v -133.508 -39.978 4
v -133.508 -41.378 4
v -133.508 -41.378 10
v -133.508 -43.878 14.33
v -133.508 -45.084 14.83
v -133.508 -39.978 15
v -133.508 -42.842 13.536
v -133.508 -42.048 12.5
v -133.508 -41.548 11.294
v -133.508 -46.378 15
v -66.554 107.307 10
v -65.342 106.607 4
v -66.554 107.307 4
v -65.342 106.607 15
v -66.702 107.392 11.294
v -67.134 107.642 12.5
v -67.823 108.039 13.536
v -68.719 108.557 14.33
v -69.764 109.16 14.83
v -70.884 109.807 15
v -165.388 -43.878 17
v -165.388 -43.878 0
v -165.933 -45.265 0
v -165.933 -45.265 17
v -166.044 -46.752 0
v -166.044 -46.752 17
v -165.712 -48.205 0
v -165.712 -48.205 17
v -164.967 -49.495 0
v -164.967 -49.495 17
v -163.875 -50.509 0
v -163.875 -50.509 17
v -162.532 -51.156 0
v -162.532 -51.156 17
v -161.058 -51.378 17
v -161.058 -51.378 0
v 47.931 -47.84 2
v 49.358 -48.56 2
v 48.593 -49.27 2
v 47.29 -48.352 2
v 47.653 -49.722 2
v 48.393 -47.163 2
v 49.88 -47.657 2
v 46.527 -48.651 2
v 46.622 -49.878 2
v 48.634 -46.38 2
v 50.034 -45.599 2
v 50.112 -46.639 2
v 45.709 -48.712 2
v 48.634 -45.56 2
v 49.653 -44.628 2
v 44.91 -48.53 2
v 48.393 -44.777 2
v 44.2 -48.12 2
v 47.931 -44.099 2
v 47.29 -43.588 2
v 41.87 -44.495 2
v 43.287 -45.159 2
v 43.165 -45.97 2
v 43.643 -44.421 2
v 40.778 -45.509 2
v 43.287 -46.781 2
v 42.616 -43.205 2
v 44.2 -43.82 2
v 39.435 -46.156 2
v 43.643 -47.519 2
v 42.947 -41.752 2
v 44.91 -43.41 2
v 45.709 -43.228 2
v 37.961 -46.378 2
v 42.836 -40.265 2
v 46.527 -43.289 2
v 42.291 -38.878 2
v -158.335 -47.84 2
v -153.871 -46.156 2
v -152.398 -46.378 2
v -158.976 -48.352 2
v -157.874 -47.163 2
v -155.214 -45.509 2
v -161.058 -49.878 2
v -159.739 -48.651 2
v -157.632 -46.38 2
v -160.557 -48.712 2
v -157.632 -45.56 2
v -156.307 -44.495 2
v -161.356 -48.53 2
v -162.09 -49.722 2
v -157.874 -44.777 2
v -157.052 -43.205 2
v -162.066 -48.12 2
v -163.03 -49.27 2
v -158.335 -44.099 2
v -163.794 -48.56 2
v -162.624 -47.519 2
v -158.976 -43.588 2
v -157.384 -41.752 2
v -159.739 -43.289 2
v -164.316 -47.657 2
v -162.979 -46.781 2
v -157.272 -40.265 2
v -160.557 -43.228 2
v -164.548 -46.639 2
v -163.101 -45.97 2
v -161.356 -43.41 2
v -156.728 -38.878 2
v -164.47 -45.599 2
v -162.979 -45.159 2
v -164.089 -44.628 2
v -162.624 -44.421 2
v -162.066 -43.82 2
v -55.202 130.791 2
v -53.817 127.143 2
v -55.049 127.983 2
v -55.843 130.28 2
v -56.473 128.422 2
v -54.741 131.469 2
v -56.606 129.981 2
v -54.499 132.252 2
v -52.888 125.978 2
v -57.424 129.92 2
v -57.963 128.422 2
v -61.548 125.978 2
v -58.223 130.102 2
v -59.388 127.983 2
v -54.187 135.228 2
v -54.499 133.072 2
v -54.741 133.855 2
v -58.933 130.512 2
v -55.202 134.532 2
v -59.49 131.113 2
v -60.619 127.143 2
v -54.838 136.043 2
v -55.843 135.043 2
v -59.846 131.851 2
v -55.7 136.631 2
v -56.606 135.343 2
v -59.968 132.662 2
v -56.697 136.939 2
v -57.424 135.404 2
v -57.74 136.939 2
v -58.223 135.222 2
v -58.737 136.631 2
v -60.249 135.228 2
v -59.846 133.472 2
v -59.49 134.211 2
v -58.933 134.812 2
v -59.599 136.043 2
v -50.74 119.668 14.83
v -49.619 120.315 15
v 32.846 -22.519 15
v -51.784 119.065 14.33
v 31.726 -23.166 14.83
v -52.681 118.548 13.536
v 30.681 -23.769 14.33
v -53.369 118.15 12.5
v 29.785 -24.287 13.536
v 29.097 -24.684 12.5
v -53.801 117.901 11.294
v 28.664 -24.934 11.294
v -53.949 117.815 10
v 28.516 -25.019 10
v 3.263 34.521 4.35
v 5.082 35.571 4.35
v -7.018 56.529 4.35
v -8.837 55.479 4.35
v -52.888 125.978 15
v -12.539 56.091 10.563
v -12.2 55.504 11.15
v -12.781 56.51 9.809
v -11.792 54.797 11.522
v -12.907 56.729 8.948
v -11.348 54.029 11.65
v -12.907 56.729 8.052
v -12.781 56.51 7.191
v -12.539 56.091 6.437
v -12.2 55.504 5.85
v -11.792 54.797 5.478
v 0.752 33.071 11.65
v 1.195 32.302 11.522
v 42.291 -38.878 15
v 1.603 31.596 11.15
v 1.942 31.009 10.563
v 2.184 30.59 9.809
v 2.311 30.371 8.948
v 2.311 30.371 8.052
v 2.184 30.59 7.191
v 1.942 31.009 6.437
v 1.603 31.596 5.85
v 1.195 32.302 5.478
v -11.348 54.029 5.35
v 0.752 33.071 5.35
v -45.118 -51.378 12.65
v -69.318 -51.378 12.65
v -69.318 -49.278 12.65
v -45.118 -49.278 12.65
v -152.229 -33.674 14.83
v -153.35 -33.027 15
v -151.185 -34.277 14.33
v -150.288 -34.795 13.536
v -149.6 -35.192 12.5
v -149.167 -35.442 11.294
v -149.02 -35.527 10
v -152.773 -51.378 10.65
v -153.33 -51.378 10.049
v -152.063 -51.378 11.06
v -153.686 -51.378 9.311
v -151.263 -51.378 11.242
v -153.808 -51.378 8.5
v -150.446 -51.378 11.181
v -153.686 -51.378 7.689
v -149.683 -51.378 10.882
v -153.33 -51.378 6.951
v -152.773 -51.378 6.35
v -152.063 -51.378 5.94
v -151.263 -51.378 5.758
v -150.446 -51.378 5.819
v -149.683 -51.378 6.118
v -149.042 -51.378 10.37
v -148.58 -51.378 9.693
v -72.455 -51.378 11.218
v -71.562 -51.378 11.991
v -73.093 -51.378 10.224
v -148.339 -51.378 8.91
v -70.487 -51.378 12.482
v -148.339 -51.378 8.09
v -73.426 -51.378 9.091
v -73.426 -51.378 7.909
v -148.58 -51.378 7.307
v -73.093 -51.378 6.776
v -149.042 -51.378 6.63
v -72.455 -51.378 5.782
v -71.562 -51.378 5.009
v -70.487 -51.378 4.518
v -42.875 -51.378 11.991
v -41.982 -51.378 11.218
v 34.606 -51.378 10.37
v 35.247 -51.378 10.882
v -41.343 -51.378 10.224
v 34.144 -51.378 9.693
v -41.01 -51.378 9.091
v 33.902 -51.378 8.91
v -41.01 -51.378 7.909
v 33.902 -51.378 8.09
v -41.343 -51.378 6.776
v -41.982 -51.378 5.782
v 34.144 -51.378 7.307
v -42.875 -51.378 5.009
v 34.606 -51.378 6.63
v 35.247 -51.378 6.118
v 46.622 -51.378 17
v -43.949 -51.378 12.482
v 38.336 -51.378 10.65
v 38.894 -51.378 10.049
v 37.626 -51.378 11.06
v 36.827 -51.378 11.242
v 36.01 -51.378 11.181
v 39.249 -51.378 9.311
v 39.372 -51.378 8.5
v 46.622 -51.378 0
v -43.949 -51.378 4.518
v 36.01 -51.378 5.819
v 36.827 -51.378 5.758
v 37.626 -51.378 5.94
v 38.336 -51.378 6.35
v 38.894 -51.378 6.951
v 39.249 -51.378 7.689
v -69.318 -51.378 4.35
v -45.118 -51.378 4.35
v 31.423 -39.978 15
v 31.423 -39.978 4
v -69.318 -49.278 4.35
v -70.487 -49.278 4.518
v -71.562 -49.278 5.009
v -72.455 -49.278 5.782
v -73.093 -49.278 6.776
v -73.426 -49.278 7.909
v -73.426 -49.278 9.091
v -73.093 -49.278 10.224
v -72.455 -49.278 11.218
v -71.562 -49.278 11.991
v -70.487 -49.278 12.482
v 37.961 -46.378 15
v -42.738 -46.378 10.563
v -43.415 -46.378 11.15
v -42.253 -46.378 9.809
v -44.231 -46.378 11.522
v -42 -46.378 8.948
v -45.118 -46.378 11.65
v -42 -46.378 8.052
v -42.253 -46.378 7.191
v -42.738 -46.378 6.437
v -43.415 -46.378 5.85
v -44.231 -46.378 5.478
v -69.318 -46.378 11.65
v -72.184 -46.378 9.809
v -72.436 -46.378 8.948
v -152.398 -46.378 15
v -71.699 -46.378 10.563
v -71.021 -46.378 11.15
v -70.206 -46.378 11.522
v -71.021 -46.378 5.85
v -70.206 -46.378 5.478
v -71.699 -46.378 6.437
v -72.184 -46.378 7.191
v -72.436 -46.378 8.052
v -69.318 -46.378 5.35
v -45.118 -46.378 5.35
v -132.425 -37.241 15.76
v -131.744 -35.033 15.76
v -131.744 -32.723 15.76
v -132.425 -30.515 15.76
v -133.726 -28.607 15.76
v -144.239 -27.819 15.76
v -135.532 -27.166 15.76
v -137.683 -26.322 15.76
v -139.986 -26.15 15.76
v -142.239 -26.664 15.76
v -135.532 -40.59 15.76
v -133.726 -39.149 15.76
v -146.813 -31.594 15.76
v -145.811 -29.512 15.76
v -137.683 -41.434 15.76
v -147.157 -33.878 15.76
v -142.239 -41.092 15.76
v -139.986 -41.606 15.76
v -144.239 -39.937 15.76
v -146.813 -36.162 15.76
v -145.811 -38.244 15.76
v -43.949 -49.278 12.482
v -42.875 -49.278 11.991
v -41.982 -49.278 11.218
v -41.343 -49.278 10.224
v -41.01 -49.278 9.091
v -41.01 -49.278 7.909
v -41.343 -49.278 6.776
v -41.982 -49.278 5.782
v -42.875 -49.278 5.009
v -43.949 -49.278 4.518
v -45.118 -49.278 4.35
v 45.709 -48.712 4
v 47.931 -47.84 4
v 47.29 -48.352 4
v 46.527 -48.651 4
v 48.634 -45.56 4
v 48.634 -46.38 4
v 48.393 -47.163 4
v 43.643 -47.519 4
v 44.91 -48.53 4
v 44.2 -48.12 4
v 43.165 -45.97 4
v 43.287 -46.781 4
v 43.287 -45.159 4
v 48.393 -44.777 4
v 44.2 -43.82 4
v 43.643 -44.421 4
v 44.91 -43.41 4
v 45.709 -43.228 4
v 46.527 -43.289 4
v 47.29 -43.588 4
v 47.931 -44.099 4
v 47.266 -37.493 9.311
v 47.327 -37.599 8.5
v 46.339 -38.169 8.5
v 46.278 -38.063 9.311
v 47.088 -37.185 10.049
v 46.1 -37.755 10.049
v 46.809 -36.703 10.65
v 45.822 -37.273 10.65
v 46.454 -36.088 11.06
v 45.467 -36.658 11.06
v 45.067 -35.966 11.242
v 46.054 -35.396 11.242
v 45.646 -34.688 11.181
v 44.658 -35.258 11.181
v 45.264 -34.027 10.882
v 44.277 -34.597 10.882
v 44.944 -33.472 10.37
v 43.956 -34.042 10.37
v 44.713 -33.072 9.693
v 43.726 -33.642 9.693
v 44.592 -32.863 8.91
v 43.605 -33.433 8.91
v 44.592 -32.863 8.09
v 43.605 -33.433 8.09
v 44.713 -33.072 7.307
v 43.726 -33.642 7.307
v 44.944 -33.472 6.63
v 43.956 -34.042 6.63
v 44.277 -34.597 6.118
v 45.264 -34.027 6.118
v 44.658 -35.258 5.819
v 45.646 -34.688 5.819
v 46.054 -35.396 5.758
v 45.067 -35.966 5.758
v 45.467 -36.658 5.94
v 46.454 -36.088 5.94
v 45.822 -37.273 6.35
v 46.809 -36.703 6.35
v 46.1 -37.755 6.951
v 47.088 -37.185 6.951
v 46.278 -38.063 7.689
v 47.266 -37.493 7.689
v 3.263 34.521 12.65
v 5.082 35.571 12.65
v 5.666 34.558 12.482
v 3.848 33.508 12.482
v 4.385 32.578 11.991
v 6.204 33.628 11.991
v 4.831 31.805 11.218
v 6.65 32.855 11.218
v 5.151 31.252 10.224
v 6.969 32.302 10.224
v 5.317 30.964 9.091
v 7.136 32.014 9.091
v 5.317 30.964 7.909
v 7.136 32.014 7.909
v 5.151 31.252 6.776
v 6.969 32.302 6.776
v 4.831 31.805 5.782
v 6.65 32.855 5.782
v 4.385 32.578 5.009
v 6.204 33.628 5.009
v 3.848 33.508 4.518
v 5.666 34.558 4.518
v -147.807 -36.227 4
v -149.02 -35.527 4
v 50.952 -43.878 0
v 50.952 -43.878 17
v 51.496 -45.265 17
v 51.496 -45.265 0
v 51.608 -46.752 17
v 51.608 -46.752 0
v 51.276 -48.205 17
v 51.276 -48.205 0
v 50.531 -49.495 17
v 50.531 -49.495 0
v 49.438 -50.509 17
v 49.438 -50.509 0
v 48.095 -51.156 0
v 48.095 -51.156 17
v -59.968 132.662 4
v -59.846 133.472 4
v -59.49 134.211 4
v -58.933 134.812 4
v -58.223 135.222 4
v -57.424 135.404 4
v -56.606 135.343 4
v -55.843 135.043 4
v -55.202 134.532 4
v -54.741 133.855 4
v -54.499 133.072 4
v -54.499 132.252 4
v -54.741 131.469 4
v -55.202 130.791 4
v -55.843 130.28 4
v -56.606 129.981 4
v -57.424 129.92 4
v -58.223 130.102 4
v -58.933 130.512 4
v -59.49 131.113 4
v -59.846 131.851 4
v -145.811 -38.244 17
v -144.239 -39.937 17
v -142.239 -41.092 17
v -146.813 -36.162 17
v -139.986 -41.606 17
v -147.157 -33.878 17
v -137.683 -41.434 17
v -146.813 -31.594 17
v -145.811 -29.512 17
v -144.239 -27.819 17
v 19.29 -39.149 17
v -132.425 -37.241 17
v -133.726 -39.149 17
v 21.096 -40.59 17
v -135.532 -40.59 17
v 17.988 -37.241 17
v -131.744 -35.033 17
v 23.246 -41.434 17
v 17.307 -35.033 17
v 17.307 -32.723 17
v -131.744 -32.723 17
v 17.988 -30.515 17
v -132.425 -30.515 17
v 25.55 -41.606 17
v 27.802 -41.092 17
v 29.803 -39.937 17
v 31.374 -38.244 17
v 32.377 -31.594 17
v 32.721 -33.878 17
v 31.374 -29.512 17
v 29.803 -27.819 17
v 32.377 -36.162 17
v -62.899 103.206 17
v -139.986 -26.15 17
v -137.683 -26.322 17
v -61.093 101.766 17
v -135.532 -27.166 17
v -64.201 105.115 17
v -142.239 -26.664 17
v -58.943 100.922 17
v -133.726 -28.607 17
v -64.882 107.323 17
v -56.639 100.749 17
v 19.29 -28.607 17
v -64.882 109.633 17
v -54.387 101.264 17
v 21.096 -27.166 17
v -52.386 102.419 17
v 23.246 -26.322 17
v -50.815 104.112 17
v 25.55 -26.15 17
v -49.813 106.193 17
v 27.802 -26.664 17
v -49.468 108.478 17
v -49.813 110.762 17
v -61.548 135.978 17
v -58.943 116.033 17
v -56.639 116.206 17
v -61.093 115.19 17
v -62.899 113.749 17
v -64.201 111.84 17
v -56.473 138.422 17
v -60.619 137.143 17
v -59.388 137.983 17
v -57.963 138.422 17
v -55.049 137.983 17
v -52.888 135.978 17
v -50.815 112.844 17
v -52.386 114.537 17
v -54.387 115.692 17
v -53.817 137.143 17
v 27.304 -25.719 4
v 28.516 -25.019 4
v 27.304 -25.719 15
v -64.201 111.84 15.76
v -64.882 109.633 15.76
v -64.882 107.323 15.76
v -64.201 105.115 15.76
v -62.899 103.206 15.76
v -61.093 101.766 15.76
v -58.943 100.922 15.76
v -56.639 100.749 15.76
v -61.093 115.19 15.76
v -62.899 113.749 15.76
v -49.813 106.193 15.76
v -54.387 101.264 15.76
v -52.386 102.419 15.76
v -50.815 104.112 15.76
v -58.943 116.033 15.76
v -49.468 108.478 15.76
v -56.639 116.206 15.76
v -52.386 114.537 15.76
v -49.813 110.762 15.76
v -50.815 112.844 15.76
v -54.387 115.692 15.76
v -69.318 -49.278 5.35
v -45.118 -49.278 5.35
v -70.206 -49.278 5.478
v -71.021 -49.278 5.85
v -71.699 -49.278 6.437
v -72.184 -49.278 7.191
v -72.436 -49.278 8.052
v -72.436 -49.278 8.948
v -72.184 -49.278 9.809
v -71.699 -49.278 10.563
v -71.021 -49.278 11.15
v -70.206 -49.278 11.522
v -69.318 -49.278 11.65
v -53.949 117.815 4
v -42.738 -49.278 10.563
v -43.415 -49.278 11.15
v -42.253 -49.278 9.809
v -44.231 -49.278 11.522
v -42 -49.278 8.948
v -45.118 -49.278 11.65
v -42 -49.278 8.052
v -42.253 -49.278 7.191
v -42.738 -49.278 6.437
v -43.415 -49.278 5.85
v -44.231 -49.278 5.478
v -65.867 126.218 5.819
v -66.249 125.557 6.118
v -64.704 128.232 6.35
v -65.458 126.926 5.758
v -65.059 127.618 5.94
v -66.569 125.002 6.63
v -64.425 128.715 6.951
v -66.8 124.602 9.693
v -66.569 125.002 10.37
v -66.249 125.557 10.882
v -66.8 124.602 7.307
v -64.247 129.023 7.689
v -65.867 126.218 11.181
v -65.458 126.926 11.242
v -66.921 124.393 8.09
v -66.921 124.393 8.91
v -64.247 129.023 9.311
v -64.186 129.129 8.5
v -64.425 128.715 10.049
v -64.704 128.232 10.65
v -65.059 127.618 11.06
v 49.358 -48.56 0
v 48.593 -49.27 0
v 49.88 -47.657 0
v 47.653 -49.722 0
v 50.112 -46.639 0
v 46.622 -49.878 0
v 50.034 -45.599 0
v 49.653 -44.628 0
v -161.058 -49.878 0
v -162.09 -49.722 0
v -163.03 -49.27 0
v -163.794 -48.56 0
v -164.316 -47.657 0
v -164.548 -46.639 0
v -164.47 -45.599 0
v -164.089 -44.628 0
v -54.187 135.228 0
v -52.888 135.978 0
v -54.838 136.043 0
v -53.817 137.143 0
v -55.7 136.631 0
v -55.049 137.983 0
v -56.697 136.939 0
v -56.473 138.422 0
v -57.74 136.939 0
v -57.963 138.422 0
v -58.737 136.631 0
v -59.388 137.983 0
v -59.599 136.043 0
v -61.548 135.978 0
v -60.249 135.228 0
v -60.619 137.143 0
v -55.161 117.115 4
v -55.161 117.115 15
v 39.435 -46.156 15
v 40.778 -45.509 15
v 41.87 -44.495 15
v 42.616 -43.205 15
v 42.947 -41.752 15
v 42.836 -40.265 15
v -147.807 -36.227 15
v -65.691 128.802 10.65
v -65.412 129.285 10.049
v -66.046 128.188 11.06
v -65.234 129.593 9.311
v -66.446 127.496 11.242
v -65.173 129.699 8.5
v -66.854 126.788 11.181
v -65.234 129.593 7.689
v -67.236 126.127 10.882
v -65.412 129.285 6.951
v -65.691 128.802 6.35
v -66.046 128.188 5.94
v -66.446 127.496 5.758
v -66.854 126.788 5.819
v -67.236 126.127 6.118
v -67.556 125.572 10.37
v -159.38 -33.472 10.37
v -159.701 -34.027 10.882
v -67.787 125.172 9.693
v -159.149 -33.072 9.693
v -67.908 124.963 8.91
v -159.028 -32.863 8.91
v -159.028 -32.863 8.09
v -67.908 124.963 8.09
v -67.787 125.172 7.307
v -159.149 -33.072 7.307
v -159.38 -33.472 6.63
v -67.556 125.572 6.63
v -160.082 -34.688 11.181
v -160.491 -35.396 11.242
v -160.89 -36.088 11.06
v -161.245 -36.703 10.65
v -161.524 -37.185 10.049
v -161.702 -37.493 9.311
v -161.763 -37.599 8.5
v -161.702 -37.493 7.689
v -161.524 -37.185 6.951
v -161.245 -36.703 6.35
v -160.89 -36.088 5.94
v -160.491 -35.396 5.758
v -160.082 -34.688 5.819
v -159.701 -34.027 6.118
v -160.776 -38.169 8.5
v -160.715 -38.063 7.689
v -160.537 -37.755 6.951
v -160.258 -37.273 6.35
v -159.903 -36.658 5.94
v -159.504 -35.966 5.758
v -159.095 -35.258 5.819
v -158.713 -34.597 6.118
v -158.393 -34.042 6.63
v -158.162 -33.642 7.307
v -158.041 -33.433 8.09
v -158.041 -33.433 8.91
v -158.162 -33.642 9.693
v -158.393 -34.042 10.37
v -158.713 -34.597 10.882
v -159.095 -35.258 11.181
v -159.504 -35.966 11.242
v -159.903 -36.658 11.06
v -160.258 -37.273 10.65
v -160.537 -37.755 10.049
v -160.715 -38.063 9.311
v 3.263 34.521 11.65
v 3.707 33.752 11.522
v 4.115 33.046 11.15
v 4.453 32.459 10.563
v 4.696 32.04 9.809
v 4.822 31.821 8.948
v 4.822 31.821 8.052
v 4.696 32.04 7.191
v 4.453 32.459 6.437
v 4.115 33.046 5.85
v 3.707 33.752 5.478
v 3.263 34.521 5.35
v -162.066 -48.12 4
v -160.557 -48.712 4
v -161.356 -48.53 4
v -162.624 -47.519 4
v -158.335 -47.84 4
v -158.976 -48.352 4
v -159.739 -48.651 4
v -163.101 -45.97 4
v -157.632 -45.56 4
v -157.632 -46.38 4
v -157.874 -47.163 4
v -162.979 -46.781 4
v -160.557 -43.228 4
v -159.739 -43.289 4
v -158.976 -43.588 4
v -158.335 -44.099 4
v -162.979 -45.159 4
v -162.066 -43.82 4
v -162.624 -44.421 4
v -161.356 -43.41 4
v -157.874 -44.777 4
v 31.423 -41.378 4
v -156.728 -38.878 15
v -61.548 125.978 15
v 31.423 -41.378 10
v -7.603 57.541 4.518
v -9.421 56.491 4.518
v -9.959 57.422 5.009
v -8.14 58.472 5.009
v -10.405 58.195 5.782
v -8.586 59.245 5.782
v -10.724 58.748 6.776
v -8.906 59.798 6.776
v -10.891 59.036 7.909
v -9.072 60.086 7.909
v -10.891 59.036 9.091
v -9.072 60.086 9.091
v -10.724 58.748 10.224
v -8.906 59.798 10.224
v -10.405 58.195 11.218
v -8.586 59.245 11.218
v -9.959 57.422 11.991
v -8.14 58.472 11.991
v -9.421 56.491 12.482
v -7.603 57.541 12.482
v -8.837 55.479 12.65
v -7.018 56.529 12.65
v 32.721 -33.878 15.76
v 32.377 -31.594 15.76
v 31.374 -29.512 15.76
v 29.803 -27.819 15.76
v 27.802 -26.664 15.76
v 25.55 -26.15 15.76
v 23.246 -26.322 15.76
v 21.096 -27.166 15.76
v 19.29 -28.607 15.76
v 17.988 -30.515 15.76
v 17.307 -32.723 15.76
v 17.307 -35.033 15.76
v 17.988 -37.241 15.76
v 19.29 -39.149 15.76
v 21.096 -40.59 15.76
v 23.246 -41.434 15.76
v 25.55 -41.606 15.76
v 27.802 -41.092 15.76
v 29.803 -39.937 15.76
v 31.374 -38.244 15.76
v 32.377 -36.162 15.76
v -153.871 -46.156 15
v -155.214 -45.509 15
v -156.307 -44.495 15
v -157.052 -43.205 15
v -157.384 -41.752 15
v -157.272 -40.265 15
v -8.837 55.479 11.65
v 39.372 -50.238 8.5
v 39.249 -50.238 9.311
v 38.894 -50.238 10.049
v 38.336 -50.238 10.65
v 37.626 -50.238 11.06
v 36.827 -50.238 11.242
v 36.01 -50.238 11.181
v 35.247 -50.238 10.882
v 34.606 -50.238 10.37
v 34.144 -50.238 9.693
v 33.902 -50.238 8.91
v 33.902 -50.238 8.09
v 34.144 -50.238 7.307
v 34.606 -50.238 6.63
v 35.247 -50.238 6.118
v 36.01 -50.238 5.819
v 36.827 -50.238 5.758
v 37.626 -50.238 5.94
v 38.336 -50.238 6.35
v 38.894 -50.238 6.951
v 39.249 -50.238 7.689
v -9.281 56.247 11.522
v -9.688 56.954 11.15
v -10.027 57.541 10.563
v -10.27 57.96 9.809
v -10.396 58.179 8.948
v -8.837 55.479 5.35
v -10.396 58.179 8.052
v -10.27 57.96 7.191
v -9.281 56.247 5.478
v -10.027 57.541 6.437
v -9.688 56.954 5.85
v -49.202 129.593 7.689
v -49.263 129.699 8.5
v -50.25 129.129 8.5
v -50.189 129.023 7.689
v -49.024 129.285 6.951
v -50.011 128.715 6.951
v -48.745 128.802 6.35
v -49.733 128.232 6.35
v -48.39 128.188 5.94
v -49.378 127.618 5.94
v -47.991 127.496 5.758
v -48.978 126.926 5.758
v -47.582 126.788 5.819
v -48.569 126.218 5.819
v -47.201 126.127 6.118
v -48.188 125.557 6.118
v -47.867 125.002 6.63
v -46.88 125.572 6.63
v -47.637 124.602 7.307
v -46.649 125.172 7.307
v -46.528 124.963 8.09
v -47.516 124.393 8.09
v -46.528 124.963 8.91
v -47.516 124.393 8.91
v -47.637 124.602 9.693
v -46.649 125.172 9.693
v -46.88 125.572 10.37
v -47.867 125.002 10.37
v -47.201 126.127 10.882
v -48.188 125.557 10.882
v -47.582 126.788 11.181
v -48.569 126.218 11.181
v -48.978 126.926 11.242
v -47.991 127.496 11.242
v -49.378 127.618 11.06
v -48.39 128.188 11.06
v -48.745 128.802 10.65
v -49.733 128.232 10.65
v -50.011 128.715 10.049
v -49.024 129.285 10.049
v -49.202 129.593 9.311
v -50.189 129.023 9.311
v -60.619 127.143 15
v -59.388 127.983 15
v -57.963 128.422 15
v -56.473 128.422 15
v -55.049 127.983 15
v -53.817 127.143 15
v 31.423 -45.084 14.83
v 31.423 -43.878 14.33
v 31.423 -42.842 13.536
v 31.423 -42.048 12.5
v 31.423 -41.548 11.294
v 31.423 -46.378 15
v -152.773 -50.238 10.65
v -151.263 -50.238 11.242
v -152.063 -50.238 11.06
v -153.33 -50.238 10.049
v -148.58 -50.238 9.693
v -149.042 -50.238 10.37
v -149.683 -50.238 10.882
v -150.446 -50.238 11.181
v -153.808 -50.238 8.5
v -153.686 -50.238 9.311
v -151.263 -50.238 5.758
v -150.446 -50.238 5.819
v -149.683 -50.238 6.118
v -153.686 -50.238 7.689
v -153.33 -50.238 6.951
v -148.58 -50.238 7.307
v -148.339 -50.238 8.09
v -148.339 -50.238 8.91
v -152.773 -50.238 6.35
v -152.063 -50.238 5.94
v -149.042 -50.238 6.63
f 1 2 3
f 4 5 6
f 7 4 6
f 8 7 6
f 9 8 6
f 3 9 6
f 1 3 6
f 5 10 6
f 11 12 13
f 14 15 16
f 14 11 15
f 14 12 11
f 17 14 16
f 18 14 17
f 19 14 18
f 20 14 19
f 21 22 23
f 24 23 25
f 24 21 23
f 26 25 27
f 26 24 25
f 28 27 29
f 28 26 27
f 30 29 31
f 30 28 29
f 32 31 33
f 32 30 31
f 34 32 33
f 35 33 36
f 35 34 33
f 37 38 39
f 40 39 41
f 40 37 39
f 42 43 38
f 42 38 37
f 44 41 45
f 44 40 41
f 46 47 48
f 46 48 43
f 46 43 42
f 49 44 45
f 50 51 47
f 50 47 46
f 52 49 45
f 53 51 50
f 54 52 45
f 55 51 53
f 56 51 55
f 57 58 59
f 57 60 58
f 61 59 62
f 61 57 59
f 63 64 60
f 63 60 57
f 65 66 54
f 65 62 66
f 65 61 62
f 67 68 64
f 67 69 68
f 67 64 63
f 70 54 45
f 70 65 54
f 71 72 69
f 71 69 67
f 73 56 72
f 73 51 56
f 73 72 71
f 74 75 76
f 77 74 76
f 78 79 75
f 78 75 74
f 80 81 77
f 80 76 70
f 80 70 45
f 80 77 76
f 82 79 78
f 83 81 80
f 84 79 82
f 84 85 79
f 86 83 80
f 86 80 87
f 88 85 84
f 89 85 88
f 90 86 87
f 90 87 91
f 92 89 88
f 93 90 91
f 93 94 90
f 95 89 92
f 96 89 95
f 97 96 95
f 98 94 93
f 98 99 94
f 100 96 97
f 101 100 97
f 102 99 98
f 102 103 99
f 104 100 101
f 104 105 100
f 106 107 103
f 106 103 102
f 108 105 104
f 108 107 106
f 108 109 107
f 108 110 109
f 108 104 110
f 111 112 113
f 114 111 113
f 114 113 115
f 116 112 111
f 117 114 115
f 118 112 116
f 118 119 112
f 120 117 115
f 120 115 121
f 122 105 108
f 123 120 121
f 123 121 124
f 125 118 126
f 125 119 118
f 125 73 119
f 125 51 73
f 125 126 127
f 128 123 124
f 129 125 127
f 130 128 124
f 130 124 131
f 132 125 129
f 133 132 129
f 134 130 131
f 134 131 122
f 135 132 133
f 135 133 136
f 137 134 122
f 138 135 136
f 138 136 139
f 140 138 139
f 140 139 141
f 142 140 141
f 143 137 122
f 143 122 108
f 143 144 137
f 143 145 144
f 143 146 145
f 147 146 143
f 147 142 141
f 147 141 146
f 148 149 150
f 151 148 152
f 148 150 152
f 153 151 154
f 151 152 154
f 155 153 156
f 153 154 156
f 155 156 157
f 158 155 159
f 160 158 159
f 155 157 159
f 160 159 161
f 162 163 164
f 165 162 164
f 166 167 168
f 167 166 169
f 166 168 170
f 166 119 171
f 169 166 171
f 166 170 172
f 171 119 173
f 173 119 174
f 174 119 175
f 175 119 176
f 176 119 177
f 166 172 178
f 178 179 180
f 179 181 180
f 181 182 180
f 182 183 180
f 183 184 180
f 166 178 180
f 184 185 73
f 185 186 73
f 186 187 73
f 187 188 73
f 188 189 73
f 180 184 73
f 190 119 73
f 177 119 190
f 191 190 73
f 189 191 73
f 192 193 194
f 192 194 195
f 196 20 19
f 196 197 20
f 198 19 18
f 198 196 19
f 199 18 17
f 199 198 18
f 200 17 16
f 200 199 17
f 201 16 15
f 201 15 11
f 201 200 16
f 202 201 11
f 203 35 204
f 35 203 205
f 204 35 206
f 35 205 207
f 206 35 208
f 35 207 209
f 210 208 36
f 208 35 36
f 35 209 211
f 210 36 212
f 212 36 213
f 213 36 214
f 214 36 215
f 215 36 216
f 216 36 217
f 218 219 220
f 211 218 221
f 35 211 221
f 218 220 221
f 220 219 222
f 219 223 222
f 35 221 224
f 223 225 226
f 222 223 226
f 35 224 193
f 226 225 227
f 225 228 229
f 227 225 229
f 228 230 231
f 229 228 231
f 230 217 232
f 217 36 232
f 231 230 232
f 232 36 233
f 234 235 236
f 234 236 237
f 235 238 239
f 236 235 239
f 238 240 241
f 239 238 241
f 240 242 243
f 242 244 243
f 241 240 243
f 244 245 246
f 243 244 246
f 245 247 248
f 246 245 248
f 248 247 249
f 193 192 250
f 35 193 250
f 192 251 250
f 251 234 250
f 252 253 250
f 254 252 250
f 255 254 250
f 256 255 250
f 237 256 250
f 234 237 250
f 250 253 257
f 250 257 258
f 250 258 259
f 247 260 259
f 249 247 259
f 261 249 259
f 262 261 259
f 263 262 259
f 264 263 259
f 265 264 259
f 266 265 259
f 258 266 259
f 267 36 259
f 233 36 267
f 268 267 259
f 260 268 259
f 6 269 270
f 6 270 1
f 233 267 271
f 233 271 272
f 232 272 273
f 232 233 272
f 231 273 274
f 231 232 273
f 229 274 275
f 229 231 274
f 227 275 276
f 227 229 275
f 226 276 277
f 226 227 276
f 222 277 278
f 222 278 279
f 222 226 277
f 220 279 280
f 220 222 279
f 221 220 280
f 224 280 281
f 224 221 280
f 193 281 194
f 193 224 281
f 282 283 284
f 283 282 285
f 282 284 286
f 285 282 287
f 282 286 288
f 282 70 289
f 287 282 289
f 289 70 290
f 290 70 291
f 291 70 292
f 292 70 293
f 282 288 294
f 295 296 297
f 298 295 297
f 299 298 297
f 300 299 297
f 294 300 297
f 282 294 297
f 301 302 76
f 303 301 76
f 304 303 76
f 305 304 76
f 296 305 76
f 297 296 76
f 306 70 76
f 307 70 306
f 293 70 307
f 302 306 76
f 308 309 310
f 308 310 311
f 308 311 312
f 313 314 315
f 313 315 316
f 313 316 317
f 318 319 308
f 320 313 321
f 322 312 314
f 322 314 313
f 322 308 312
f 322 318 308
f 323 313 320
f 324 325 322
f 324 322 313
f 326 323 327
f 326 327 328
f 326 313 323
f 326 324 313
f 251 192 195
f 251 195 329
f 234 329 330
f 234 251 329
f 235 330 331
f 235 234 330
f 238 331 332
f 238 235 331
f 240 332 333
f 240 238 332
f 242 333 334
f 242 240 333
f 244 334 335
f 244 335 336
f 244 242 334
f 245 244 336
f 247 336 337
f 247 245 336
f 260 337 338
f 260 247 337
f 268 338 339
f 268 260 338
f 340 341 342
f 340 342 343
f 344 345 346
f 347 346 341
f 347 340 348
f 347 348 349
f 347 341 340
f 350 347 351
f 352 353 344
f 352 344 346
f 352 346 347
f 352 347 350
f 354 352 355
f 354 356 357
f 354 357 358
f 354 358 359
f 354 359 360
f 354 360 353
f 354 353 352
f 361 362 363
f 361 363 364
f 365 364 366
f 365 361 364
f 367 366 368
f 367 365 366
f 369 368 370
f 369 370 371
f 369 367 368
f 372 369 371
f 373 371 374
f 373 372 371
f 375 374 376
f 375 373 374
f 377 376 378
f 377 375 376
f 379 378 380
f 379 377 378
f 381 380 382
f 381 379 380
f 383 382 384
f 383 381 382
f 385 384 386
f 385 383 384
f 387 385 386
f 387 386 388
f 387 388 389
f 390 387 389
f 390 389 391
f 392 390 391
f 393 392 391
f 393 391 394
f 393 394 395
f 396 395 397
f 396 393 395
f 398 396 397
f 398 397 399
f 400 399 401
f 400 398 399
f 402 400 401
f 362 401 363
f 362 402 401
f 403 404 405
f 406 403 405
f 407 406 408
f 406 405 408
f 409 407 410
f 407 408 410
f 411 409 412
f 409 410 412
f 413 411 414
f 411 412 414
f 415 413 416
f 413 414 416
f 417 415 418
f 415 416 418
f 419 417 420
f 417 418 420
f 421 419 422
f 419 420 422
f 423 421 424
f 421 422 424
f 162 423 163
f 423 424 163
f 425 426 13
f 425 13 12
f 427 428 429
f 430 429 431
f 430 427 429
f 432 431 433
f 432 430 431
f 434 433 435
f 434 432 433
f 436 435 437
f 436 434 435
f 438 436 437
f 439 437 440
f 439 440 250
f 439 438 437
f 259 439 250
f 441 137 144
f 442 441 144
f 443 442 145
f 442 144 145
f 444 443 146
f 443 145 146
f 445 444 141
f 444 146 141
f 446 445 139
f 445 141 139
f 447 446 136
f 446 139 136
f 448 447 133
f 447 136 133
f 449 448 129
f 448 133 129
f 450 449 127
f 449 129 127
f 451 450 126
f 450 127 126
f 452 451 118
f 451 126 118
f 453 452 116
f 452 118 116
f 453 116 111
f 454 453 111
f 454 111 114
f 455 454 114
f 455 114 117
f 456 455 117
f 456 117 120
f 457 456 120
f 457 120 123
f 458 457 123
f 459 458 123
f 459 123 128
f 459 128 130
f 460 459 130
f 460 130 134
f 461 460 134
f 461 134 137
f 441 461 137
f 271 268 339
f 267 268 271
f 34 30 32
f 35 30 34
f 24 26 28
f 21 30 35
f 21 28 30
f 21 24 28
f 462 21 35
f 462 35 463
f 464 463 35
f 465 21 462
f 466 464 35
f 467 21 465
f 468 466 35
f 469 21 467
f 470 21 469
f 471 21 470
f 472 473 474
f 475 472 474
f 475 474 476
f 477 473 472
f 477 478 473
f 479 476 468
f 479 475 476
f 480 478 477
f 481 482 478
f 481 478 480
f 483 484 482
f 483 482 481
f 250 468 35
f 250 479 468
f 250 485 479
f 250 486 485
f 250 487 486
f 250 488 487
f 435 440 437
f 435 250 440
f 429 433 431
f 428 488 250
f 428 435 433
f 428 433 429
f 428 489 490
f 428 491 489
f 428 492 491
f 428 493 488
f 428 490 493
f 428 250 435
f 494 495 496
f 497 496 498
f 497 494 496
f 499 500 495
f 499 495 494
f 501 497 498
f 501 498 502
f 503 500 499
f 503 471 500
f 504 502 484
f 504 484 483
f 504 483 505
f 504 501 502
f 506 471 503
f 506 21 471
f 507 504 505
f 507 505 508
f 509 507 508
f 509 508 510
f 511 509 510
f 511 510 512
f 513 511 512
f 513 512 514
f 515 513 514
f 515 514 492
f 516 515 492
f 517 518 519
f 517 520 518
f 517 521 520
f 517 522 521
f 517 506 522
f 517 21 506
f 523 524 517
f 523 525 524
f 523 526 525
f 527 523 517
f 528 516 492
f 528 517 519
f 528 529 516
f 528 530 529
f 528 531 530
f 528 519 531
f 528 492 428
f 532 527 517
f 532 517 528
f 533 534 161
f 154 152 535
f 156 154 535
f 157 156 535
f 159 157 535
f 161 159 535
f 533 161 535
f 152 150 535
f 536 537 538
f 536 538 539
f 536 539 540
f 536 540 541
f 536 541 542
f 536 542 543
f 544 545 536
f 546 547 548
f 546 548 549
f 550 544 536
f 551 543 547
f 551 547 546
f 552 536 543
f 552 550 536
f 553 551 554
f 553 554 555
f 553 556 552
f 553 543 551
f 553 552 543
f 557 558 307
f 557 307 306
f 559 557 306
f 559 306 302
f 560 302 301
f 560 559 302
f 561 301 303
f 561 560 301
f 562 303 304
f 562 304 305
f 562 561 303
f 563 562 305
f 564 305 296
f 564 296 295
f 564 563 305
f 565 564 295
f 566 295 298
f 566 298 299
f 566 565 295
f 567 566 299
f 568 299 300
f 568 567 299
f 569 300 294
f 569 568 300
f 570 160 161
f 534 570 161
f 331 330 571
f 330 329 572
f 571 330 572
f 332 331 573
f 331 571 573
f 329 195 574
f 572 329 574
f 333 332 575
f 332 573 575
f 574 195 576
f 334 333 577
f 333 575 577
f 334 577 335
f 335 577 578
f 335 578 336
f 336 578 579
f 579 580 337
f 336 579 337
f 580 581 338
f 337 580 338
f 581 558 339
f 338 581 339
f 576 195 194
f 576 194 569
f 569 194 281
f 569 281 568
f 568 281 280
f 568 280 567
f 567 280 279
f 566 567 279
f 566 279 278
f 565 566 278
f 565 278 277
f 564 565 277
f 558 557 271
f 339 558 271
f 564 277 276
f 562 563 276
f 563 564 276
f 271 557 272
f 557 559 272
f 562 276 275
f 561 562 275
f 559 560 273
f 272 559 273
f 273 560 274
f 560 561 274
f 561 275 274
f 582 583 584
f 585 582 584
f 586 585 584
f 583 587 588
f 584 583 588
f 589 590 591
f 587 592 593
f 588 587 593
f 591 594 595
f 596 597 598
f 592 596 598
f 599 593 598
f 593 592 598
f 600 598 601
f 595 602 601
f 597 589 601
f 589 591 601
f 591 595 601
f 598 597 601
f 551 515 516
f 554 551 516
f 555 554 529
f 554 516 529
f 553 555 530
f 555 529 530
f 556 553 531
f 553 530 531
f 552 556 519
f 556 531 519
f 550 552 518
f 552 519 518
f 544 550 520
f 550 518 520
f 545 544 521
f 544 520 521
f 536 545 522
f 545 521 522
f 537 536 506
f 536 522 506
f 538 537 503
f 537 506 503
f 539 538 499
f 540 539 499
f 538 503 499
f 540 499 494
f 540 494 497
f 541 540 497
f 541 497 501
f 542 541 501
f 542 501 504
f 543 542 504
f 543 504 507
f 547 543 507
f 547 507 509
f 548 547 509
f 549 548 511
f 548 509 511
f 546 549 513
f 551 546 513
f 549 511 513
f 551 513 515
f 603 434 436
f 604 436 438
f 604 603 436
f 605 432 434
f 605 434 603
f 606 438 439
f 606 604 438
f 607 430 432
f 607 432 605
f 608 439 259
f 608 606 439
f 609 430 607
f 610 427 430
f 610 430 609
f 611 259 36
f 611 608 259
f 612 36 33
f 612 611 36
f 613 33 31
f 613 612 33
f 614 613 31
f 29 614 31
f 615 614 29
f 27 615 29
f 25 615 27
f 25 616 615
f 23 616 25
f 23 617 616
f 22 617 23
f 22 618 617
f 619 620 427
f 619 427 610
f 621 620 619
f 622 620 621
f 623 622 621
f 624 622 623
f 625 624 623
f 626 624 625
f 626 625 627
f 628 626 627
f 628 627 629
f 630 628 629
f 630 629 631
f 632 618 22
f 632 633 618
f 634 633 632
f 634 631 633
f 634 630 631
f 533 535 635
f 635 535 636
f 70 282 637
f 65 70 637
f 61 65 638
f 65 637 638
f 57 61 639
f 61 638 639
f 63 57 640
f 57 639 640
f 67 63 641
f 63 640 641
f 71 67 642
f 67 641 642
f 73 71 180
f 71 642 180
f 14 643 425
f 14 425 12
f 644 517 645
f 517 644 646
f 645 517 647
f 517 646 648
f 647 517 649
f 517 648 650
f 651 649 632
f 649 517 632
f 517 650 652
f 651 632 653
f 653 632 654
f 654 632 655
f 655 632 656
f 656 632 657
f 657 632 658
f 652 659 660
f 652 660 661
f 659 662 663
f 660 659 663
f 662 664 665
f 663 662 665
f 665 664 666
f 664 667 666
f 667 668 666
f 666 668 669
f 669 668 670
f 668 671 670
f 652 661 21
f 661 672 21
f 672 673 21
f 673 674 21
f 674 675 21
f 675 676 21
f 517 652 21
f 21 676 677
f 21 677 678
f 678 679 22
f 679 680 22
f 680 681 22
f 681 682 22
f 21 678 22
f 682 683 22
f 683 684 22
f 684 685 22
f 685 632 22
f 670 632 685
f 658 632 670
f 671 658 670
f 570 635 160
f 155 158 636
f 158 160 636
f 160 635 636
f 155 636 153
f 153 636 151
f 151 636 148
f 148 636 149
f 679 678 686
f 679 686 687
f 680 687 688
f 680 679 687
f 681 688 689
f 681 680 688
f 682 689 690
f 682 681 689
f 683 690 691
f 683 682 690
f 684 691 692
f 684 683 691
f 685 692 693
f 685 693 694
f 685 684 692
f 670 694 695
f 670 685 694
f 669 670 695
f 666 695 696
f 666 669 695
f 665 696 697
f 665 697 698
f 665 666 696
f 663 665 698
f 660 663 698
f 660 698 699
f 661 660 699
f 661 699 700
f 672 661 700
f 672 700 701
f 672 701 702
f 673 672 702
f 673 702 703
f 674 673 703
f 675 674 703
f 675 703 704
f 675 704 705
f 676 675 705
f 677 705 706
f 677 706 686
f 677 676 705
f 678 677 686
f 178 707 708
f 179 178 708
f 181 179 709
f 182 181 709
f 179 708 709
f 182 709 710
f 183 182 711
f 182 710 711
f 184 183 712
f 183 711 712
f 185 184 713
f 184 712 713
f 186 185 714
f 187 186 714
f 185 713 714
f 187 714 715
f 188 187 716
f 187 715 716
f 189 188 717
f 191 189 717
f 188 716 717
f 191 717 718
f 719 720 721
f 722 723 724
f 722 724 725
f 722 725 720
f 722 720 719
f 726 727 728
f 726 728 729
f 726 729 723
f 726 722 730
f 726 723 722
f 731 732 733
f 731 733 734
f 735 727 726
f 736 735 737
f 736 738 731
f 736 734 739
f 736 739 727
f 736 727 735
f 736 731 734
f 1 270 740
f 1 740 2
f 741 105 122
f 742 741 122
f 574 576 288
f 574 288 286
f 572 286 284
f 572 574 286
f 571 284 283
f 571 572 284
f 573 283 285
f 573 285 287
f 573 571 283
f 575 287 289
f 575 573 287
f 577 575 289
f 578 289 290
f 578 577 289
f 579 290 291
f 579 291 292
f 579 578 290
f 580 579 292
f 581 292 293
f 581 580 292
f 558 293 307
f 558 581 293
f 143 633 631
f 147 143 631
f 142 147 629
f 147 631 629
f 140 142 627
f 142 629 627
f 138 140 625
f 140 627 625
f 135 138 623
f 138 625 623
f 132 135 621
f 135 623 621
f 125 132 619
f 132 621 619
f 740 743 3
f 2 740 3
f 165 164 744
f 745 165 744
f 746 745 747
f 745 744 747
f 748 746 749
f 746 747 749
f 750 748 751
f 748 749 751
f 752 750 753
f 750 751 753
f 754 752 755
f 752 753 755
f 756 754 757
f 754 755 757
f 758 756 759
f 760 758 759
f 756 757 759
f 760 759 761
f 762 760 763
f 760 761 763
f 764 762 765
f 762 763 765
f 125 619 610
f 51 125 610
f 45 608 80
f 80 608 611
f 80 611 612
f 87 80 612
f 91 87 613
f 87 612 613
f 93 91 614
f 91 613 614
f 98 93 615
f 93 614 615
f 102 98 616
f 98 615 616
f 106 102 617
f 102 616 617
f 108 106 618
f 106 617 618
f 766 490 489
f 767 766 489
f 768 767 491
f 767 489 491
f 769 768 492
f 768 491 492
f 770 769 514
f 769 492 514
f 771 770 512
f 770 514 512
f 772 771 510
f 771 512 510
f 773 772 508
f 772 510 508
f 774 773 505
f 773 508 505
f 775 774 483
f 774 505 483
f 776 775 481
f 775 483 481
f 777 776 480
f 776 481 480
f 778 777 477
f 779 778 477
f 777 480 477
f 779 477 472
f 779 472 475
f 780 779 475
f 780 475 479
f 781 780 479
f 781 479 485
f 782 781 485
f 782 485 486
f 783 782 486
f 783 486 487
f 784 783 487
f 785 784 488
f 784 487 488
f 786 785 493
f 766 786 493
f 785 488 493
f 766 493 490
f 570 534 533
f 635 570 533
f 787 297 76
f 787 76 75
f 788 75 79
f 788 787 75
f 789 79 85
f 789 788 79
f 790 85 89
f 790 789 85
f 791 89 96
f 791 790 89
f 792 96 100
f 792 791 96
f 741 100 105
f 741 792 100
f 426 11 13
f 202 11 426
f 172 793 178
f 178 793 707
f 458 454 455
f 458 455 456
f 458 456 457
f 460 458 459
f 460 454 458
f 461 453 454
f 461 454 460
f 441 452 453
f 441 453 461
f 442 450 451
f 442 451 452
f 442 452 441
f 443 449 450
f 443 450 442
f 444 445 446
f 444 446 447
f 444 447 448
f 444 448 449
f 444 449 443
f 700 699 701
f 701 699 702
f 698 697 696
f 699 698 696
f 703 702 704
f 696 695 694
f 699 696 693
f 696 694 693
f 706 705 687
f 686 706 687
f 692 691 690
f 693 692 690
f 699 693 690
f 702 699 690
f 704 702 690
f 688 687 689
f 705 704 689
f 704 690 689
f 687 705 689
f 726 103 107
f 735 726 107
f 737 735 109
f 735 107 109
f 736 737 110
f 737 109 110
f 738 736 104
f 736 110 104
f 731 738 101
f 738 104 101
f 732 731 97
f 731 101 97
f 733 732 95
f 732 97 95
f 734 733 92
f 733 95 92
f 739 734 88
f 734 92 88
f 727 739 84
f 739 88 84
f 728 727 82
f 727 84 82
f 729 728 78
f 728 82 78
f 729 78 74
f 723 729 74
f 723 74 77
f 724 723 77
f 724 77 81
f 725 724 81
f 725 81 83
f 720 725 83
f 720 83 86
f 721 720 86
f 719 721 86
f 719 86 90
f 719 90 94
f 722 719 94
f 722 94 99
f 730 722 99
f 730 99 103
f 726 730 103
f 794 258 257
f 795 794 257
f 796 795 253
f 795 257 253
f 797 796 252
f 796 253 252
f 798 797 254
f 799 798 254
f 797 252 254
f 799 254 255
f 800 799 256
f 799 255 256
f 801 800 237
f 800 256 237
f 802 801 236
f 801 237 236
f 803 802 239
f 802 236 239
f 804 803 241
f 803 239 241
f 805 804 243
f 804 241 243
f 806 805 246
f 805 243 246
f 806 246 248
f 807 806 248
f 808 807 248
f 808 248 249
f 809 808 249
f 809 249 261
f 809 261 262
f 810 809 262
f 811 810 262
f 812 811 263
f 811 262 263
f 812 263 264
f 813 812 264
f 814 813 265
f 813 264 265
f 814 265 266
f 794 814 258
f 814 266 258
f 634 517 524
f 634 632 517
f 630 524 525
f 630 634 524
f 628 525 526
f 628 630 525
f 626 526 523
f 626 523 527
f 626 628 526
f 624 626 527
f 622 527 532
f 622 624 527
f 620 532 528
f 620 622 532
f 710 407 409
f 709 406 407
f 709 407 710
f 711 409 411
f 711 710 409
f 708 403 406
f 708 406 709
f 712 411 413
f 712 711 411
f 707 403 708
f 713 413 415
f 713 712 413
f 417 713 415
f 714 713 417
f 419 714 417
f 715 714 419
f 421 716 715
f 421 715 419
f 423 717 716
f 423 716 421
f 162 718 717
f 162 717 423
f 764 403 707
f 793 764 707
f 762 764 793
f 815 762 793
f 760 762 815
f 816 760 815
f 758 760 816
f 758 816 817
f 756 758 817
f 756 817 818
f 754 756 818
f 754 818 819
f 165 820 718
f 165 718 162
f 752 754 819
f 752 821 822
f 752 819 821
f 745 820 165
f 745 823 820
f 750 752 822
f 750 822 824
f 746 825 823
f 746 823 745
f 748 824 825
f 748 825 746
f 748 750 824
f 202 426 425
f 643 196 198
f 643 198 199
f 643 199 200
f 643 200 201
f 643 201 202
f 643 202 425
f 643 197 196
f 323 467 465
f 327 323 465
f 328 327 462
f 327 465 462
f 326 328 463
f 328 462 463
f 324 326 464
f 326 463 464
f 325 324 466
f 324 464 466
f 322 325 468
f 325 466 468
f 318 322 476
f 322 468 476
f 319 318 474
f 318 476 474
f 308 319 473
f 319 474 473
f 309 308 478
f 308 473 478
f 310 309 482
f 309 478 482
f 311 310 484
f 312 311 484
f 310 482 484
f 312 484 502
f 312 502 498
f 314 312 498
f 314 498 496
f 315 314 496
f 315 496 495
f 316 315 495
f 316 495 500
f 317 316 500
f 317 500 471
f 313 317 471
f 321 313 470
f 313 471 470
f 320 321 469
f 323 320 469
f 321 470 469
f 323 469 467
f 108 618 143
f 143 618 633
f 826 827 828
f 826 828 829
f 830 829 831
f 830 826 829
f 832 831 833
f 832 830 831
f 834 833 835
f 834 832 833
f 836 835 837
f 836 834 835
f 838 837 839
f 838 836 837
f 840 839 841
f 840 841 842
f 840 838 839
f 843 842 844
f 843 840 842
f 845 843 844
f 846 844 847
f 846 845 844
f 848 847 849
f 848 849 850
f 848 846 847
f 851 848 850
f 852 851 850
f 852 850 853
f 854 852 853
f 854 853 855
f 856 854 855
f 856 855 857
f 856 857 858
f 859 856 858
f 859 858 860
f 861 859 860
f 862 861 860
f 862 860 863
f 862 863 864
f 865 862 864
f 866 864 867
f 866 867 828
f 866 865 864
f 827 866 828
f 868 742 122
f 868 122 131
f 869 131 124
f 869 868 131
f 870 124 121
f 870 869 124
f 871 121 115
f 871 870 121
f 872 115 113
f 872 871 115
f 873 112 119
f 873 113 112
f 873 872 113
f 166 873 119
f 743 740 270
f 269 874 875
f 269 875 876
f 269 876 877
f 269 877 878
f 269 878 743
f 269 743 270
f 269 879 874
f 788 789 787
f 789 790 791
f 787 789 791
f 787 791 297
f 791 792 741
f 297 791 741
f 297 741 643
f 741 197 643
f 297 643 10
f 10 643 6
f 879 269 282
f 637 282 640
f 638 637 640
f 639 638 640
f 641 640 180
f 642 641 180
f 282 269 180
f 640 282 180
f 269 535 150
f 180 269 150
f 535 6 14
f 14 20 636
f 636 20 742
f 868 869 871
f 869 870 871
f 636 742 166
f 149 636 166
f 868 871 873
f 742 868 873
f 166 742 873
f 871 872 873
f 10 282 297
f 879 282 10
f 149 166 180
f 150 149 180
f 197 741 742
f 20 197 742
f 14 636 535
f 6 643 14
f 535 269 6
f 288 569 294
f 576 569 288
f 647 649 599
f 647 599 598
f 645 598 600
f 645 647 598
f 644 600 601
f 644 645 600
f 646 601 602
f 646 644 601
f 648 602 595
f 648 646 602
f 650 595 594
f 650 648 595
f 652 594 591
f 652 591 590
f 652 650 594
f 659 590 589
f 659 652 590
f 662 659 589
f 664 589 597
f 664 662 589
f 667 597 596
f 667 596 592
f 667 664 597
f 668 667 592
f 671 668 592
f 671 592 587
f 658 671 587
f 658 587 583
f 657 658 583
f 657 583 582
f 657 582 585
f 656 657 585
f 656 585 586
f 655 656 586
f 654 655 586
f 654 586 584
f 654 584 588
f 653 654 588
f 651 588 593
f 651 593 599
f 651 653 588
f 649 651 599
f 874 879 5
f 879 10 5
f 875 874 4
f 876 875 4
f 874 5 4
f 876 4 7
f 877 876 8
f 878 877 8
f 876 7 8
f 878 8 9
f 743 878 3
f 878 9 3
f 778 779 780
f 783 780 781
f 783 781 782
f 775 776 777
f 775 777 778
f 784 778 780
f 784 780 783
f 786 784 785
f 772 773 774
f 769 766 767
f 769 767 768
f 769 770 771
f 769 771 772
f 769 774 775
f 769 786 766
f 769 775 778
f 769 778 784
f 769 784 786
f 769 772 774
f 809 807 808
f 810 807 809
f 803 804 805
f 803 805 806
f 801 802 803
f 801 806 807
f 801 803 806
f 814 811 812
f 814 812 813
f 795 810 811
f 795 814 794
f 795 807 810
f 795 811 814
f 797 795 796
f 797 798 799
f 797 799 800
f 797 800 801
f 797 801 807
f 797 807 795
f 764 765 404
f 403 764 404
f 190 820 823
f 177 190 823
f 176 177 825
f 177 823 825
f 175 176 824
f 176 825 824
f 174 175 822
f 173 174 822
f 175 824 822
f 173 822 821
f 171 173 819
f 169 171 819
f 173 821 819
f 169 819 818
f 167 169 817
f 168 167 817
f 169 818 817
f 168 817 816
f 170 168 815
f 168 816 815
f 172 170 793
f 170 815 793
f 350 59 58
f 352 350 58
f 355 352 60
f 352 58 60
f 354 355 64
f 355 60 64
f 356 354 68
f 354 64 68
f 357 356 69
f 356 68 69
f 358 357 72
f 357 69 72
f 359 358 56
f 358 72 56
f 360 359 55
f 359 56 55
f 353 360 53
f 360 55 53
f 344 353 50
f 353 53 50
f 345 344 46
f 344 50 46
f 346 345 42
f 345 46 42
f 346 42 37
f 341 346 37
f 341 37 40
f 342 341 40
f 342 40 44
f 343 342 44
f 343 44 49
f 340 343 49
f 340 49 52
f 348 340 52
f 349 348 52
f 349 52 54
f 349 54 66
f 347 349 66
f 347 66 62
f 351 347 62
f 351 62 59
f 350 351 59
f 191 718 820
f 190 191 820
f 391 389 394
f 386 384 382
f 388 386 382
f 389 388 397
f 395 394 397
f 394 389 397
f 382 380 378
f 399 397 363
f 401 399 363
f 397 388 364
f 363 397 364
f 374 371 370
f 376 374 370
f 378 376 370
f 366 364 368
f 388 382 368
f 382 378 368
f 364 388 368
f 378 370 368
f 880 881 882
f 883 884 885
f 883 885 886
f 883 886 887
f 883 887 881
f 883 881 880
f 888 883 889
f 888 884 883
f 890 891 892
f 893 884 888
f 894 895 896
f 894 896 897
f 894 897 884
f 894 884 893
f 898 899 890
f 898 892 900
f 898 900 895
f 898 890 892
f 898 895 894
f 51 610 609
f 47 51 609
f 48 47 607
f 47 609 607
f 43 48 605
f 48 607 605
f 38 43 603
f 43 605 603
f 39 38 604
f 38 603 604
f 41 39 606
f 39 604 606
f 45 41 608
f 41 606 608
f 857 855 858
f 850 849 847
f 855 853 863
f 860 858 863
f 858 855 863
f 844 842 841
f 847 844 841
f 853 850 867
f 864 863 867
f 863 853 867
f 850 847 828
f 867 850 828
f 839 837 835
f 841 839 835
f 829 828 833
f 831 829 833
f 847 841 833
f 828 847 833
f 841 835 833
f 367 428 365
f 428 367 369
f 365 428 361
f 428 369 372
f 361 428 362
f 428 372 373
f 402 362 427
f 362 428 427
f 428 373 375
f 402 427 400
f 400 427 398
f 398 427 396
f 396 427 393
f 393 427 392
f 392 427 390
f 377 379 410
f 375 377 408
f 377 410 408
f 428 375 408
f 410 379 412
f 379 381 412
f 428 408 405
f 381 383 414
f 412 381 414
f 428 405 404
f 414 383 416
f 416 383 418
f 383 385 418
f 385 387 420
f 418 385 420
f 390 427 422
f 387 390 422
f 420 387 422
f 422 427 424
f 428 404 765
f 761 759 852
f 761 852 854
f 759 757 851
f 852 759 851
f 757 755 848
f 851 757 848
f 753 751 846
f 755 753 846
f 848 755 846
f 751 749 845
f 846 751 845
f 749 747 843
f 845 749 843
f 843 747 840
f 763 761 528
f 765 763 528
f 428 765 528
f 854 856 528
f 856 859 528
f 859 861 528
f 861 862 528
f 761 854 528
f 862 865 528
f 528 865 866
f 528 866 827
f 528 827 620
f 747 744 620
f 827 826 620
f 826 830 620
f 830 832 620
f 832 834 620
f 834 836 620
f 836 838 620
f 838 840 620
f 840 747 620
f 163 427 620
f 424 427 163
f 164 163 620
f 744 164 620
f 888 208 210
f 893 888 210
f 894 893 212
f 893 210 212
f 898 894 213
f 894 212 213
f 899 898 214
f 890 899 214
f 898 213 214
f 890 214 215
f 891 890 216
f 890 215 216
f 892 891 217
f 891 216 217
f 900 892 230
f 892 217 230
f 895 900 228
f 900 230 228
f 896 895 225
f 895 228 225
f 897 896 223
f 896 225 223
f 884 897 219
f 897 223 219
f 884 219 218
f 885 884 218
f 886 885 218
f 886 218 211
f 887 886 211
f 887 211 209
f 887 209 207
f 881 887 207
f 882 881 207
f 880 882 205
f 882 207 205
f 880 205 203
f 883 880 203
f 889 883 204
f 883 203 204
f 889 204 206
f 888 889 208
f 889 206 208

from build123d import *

# Parameters (mm, degrees)
BOSS_EXTRU_1_DEPTH      = 15
BOSS_EXTRU_2_DEPTH      = 2
ESQUISSE3_W             = 164.930853143
ESQUISSE3_H             = 1.4
BOSS_EXTRU_3_DEPTH      = 11
ENL_V_MAT_EXTRU_1_DEPTH = 2.1
ENL_V_MAT_EXTRU_2_REACH = 232.446
CONG_1_R                = 5
ESQUISSE6_R             = 7.75
ENL_V_MAT_EXTRU_3_DEPTH = 1.24
ESQUISSE7_R             = 2.75
ENL_V_MAT_EXTRU_4_DEPTH = 1.14
CONG_2_R                = 5
ENL_V_MAT_EXTRU_6_DEPTH = 2
ESQUISSE8_R             = 2.75
ENL_V_MAT_EXTRU_5_DEPTH = 4


with BuildPart() as part:
    # Esquisse1 → Boss.-Extru.1 (new body)
    with BuildSketch(Plane.XY):
        Polygon((-169.71822613, -51.377911564), (-57.21822613, 143.477804287), (55.28177387, -51.377911564), align=None)
        Polygon((46.621519833, -46.377911564), (-161.057972092, -46.377911564), (-57.21822613, 133.477804287), align=None, mode=Mode.SUBTRACT)
    extrude(amount=BOSS_EXTRU_1_DEPTH)

    # Esquisse2 → Boss.-Extru.2 (add)
    with BuildSketch(Plane.XY.offset(15)):
        Polygon((-57.21822613, 143.477804287), (-169.71822613, -51.377911564), (55.28177387, -51.377911564), align=None)
    extrude(amount=BOSS_EXTRU_2_DEPTH)

    # Esquisse3 → Boss.-Extru.3 (add)
    with BuildSketch(Plane(origin=(0, 0, 15), x_dir=(-1, 0, 0), z_dir=(0, 0, -1))):
        Polygon((53.949011072, 117.815357706), (-28.5164155, -25.018950984), (-27.303979934, -25.718950984), (55.161446637, 117.115357706), align=None)
        Polygon((149.019751584, -35.527102012), (147.807316018, -36.227102012), (65.341889447, 106.607206677), (66.554325012, 107.307206677), align=None)
        with Locations((51.042590893, -40.677911564)):
            Rectangle(ESQUISSE3_W, ESQUISSE3_H)
    extrude(amount=BOSS_EXTRU_3_DEPTH)

    # Esquisse4 → Enlèv. mat.-Extru.1 (cut)
    with BuildSketch(Plane(origin=(19.214042099, 11.093232378, 0), x_dir=(0, 0, -1), z_dir=(0.8660254037844387, 0.5000000000000001, 0))):
        with BuildLine():
            Line((-12.65, 52.464536457), (-12.65, 28.264536457))
            ThreePointArc((-12.65, 28.264536457), (-8.5, 24.114536457), (-4.35, 28.264536457))
            Line((-4.35, 28.264536457), (-4.35, 52.464536457))
            ThreePointArc((-4.35, 52.464536457), (-8.5, 56.614536457), (-12.65, 52.464536457))
        make_face()
    enl_v_mat_extru_1 = extrude(amount=-ENL_V_MAT_EXTRU_1_DEPTH, mode=Mode.SUBTRACT)

    # Esquisse5 → Enlèv. mat.-Extru.2 (cut, up to next)
    with BuildSketch(Plane(origin=(17.395388751, 10.043232378, 0), x_dir=(0, 0, -1), z_dir=(0.8660254037844386, 0.5000000000000003, 0)), mode=Mode.PRIVATE) as enl_v_mat_extru_2_sk1:
        with BuildLine():
            Line((-11.65, 52.464536457), (-11.65, 28.264536457))
            ThreePointArc((-11.65, 28.264536457), (-8.5, 25.114536457), (-5.35, 28.264536457))
            Line((-5.35, 28.264536457), (-5.35, 52.464536457))
            ThreePointArc((-5.35, 52.464536457), (-8.5, 55.614536457), (-11.65, 52.464536457))
        make_face()
    enl_v_mat_extru_2_tool1 = extrude(enl_v_mat_extru_2_sk1.sketch, amount=-ENL_V_MAT_EXTRU_2_REACH, mode=Mode.PRIVATE) & part.part
    enl_v_mat_extru_2 = enl_v_mat_extru_2_tool1.solids().sort_by_distance((-2.786879, 44.999946, 8.5))[0]
    add(enl_v_mat_extru_2, mode=Mode.SUBTRACT)

    # Congé1
    cong_1_edges = [part.edges().sort_by_distance(p)[0] for p in [
        (46.621519833, -46.377911564, 7.5),
        (-57.21822613, 133.477804287, 7.5),
        (-161.057972092, -46.377911564, 7.5),
        (-169.71822613, -51.377911564, 8.5),
        (-57.21822613, 143.477804287, 8.5),
        (55.28177387, -51.377911564, 8.5),
    ]]
    fillet(cong_1_edges, radius=CONG_1_R)

    # Symétrie1: Enlèv. mat.-Extru.1, Enlèv. mat.-Extru.2 across plane
    add(enl_v_mat_extru_1.mirror(Plane(origin=(-8.426844836, -14.595723404, 0), x_dir=(0, 0, 1), z_dir=(0.5000000000000001, 0.8660254037844386, 0))), mode=Mode.SUBTRACT)
    add(enl_v_mat_extru_2.mirror(Plane(origin=(-8.426844836, -14.595723404, 0), x_dir=(0, 0, 1), z_dir=(0.5000000000000001, 0.8660254037844386, 0))), mode=Mode.SUBTRACT)

    # Esquisse6 → Enlèv. mat.-Extru.3 (cut)
    with BuildSketch(Plane.XY.offset(17)):
        with Locations((-57.21822613, 108.477804287)):
            Circle(ESQUISSE6_R)
        with Locations(Location((-139.407336997, -33.877911564, 0), (0, 0, 180))):
            Circle(ESQUISSE6_R)
        with Locations((24.970884738, -33.877911564)):
            Circle(ESQUISSE6_R)
    extrude(amount=-ENL_V_MAT_EXTRU_3_DEPTH, mode=Mode.SUBTRACT)

    # Esquisse7 → Enlèv. mat.-Extru.4 (cut)
    with BuildSketch(Plane.XZ.offset(51.377911564)):
        with Locations((36.621519833, 8.5)):
            Circle(ESQUISSE7_R)
        with Locations(Location((-151.057972092, 8.5, 0), (0, 0, 180))):
            Circle(ESQUISSE7_R)
    enl_v_mat_extru_4 = extrude(amount=-ENL_V_MAT_EXTRU_4_DEPTH, mode=Mode.SUBTRACT)

    # Symétrie2: Enlèv. mat.-Extru.4 across plane
    add(enl_v_mat_extru_4.mirror(Plane(origin=(-8.426844836, -14.595723404, 0), x_dir=(0, 0, 1), z_dir=(0.5000000000000001, 0.8660254037844386, 0))), mode=Mode.SUBTRACT)

    # Symétrie3: Enlèv. mat.-Extru.4 across plane
    add(enl_v_mat_extru_4.mirror(Plane(origin=(-20.182268228, 34.956713983, 0), x_dir=(0, 0, 1), z_dir=(0.5000000000000001, -0.8660254037844387, 0))), mode=Mode.SUBTRACT)

    # Congé2
    cong_2_edges = [part.edges().sort_by_distance(p)[0] for p in [
        (-12.716297786, 46.398203361, 15),
        (-107.787038298, 35.890052333, 15),
        (-51.042590892, -41.377911564, 15),
    ]]
    fillet(cong_2_edges, radius=CONG_2_R - 0.0001)  # a hair under: the kernel refuses the full size

    # Esquisse9 → Enlèv. mat.-Extru.6 (cut)
    with BuildSketch(Plane(origin=(0, 0, 0), x_dir=(-1, 0, 0), z_dir=(0, 0, -1))):
        with BuildLine():
            Line((164.089061005, -44.627911564), (60.249315043, 135.227804287))
            ThreePointArc((60.249315043, 135.227804287), (57.21822613, 136.977804287), (54.187137216, 135.227804287))
            Line((54.187137216, 135.227804287), (-49.652608746, -44.627911564))
            ThreePointArc((-49.652608746, -44.627911564), (-49.652608746, -48.127911564), (-46.621519833, -49.877911564))
            Line((-46.621519833, -49.877911564), (161.057972092, -49.877911564))
            ThreePointArc((161.057972092, -49.877911564), (164.089061005, -48.127911564), (164.089061005, -44.627911564))
        make_face()
    extrude(amount=-ENL_V_MAT_EXTRU_6_DEPTH, mode=Mode.SUBTRACT)

    # Esquisse8 → Enlèv. mat.-Extru.5 (cut)
    with BuildSketch(Plane(origin=(0, 0, 0), x_dir=(-1, 0, 0), z_dir=(0, 0, -1))):
        with Locations((-45.914902423, -45.969945813)):
            Circle(ESQUISSE8_R)
        with Locations((57.21822613, 132.661872783)):
            Circle(ESQUISSE8_R)
        with Locations((160.351354682, -45.969945813)):
            Circle(ESQUISSE8_R)
    extrude(amount=-ENL_V_MAT_EXTRU_5_DEPTH, mode=Mode.SUBTRACT)


solid = part.part
